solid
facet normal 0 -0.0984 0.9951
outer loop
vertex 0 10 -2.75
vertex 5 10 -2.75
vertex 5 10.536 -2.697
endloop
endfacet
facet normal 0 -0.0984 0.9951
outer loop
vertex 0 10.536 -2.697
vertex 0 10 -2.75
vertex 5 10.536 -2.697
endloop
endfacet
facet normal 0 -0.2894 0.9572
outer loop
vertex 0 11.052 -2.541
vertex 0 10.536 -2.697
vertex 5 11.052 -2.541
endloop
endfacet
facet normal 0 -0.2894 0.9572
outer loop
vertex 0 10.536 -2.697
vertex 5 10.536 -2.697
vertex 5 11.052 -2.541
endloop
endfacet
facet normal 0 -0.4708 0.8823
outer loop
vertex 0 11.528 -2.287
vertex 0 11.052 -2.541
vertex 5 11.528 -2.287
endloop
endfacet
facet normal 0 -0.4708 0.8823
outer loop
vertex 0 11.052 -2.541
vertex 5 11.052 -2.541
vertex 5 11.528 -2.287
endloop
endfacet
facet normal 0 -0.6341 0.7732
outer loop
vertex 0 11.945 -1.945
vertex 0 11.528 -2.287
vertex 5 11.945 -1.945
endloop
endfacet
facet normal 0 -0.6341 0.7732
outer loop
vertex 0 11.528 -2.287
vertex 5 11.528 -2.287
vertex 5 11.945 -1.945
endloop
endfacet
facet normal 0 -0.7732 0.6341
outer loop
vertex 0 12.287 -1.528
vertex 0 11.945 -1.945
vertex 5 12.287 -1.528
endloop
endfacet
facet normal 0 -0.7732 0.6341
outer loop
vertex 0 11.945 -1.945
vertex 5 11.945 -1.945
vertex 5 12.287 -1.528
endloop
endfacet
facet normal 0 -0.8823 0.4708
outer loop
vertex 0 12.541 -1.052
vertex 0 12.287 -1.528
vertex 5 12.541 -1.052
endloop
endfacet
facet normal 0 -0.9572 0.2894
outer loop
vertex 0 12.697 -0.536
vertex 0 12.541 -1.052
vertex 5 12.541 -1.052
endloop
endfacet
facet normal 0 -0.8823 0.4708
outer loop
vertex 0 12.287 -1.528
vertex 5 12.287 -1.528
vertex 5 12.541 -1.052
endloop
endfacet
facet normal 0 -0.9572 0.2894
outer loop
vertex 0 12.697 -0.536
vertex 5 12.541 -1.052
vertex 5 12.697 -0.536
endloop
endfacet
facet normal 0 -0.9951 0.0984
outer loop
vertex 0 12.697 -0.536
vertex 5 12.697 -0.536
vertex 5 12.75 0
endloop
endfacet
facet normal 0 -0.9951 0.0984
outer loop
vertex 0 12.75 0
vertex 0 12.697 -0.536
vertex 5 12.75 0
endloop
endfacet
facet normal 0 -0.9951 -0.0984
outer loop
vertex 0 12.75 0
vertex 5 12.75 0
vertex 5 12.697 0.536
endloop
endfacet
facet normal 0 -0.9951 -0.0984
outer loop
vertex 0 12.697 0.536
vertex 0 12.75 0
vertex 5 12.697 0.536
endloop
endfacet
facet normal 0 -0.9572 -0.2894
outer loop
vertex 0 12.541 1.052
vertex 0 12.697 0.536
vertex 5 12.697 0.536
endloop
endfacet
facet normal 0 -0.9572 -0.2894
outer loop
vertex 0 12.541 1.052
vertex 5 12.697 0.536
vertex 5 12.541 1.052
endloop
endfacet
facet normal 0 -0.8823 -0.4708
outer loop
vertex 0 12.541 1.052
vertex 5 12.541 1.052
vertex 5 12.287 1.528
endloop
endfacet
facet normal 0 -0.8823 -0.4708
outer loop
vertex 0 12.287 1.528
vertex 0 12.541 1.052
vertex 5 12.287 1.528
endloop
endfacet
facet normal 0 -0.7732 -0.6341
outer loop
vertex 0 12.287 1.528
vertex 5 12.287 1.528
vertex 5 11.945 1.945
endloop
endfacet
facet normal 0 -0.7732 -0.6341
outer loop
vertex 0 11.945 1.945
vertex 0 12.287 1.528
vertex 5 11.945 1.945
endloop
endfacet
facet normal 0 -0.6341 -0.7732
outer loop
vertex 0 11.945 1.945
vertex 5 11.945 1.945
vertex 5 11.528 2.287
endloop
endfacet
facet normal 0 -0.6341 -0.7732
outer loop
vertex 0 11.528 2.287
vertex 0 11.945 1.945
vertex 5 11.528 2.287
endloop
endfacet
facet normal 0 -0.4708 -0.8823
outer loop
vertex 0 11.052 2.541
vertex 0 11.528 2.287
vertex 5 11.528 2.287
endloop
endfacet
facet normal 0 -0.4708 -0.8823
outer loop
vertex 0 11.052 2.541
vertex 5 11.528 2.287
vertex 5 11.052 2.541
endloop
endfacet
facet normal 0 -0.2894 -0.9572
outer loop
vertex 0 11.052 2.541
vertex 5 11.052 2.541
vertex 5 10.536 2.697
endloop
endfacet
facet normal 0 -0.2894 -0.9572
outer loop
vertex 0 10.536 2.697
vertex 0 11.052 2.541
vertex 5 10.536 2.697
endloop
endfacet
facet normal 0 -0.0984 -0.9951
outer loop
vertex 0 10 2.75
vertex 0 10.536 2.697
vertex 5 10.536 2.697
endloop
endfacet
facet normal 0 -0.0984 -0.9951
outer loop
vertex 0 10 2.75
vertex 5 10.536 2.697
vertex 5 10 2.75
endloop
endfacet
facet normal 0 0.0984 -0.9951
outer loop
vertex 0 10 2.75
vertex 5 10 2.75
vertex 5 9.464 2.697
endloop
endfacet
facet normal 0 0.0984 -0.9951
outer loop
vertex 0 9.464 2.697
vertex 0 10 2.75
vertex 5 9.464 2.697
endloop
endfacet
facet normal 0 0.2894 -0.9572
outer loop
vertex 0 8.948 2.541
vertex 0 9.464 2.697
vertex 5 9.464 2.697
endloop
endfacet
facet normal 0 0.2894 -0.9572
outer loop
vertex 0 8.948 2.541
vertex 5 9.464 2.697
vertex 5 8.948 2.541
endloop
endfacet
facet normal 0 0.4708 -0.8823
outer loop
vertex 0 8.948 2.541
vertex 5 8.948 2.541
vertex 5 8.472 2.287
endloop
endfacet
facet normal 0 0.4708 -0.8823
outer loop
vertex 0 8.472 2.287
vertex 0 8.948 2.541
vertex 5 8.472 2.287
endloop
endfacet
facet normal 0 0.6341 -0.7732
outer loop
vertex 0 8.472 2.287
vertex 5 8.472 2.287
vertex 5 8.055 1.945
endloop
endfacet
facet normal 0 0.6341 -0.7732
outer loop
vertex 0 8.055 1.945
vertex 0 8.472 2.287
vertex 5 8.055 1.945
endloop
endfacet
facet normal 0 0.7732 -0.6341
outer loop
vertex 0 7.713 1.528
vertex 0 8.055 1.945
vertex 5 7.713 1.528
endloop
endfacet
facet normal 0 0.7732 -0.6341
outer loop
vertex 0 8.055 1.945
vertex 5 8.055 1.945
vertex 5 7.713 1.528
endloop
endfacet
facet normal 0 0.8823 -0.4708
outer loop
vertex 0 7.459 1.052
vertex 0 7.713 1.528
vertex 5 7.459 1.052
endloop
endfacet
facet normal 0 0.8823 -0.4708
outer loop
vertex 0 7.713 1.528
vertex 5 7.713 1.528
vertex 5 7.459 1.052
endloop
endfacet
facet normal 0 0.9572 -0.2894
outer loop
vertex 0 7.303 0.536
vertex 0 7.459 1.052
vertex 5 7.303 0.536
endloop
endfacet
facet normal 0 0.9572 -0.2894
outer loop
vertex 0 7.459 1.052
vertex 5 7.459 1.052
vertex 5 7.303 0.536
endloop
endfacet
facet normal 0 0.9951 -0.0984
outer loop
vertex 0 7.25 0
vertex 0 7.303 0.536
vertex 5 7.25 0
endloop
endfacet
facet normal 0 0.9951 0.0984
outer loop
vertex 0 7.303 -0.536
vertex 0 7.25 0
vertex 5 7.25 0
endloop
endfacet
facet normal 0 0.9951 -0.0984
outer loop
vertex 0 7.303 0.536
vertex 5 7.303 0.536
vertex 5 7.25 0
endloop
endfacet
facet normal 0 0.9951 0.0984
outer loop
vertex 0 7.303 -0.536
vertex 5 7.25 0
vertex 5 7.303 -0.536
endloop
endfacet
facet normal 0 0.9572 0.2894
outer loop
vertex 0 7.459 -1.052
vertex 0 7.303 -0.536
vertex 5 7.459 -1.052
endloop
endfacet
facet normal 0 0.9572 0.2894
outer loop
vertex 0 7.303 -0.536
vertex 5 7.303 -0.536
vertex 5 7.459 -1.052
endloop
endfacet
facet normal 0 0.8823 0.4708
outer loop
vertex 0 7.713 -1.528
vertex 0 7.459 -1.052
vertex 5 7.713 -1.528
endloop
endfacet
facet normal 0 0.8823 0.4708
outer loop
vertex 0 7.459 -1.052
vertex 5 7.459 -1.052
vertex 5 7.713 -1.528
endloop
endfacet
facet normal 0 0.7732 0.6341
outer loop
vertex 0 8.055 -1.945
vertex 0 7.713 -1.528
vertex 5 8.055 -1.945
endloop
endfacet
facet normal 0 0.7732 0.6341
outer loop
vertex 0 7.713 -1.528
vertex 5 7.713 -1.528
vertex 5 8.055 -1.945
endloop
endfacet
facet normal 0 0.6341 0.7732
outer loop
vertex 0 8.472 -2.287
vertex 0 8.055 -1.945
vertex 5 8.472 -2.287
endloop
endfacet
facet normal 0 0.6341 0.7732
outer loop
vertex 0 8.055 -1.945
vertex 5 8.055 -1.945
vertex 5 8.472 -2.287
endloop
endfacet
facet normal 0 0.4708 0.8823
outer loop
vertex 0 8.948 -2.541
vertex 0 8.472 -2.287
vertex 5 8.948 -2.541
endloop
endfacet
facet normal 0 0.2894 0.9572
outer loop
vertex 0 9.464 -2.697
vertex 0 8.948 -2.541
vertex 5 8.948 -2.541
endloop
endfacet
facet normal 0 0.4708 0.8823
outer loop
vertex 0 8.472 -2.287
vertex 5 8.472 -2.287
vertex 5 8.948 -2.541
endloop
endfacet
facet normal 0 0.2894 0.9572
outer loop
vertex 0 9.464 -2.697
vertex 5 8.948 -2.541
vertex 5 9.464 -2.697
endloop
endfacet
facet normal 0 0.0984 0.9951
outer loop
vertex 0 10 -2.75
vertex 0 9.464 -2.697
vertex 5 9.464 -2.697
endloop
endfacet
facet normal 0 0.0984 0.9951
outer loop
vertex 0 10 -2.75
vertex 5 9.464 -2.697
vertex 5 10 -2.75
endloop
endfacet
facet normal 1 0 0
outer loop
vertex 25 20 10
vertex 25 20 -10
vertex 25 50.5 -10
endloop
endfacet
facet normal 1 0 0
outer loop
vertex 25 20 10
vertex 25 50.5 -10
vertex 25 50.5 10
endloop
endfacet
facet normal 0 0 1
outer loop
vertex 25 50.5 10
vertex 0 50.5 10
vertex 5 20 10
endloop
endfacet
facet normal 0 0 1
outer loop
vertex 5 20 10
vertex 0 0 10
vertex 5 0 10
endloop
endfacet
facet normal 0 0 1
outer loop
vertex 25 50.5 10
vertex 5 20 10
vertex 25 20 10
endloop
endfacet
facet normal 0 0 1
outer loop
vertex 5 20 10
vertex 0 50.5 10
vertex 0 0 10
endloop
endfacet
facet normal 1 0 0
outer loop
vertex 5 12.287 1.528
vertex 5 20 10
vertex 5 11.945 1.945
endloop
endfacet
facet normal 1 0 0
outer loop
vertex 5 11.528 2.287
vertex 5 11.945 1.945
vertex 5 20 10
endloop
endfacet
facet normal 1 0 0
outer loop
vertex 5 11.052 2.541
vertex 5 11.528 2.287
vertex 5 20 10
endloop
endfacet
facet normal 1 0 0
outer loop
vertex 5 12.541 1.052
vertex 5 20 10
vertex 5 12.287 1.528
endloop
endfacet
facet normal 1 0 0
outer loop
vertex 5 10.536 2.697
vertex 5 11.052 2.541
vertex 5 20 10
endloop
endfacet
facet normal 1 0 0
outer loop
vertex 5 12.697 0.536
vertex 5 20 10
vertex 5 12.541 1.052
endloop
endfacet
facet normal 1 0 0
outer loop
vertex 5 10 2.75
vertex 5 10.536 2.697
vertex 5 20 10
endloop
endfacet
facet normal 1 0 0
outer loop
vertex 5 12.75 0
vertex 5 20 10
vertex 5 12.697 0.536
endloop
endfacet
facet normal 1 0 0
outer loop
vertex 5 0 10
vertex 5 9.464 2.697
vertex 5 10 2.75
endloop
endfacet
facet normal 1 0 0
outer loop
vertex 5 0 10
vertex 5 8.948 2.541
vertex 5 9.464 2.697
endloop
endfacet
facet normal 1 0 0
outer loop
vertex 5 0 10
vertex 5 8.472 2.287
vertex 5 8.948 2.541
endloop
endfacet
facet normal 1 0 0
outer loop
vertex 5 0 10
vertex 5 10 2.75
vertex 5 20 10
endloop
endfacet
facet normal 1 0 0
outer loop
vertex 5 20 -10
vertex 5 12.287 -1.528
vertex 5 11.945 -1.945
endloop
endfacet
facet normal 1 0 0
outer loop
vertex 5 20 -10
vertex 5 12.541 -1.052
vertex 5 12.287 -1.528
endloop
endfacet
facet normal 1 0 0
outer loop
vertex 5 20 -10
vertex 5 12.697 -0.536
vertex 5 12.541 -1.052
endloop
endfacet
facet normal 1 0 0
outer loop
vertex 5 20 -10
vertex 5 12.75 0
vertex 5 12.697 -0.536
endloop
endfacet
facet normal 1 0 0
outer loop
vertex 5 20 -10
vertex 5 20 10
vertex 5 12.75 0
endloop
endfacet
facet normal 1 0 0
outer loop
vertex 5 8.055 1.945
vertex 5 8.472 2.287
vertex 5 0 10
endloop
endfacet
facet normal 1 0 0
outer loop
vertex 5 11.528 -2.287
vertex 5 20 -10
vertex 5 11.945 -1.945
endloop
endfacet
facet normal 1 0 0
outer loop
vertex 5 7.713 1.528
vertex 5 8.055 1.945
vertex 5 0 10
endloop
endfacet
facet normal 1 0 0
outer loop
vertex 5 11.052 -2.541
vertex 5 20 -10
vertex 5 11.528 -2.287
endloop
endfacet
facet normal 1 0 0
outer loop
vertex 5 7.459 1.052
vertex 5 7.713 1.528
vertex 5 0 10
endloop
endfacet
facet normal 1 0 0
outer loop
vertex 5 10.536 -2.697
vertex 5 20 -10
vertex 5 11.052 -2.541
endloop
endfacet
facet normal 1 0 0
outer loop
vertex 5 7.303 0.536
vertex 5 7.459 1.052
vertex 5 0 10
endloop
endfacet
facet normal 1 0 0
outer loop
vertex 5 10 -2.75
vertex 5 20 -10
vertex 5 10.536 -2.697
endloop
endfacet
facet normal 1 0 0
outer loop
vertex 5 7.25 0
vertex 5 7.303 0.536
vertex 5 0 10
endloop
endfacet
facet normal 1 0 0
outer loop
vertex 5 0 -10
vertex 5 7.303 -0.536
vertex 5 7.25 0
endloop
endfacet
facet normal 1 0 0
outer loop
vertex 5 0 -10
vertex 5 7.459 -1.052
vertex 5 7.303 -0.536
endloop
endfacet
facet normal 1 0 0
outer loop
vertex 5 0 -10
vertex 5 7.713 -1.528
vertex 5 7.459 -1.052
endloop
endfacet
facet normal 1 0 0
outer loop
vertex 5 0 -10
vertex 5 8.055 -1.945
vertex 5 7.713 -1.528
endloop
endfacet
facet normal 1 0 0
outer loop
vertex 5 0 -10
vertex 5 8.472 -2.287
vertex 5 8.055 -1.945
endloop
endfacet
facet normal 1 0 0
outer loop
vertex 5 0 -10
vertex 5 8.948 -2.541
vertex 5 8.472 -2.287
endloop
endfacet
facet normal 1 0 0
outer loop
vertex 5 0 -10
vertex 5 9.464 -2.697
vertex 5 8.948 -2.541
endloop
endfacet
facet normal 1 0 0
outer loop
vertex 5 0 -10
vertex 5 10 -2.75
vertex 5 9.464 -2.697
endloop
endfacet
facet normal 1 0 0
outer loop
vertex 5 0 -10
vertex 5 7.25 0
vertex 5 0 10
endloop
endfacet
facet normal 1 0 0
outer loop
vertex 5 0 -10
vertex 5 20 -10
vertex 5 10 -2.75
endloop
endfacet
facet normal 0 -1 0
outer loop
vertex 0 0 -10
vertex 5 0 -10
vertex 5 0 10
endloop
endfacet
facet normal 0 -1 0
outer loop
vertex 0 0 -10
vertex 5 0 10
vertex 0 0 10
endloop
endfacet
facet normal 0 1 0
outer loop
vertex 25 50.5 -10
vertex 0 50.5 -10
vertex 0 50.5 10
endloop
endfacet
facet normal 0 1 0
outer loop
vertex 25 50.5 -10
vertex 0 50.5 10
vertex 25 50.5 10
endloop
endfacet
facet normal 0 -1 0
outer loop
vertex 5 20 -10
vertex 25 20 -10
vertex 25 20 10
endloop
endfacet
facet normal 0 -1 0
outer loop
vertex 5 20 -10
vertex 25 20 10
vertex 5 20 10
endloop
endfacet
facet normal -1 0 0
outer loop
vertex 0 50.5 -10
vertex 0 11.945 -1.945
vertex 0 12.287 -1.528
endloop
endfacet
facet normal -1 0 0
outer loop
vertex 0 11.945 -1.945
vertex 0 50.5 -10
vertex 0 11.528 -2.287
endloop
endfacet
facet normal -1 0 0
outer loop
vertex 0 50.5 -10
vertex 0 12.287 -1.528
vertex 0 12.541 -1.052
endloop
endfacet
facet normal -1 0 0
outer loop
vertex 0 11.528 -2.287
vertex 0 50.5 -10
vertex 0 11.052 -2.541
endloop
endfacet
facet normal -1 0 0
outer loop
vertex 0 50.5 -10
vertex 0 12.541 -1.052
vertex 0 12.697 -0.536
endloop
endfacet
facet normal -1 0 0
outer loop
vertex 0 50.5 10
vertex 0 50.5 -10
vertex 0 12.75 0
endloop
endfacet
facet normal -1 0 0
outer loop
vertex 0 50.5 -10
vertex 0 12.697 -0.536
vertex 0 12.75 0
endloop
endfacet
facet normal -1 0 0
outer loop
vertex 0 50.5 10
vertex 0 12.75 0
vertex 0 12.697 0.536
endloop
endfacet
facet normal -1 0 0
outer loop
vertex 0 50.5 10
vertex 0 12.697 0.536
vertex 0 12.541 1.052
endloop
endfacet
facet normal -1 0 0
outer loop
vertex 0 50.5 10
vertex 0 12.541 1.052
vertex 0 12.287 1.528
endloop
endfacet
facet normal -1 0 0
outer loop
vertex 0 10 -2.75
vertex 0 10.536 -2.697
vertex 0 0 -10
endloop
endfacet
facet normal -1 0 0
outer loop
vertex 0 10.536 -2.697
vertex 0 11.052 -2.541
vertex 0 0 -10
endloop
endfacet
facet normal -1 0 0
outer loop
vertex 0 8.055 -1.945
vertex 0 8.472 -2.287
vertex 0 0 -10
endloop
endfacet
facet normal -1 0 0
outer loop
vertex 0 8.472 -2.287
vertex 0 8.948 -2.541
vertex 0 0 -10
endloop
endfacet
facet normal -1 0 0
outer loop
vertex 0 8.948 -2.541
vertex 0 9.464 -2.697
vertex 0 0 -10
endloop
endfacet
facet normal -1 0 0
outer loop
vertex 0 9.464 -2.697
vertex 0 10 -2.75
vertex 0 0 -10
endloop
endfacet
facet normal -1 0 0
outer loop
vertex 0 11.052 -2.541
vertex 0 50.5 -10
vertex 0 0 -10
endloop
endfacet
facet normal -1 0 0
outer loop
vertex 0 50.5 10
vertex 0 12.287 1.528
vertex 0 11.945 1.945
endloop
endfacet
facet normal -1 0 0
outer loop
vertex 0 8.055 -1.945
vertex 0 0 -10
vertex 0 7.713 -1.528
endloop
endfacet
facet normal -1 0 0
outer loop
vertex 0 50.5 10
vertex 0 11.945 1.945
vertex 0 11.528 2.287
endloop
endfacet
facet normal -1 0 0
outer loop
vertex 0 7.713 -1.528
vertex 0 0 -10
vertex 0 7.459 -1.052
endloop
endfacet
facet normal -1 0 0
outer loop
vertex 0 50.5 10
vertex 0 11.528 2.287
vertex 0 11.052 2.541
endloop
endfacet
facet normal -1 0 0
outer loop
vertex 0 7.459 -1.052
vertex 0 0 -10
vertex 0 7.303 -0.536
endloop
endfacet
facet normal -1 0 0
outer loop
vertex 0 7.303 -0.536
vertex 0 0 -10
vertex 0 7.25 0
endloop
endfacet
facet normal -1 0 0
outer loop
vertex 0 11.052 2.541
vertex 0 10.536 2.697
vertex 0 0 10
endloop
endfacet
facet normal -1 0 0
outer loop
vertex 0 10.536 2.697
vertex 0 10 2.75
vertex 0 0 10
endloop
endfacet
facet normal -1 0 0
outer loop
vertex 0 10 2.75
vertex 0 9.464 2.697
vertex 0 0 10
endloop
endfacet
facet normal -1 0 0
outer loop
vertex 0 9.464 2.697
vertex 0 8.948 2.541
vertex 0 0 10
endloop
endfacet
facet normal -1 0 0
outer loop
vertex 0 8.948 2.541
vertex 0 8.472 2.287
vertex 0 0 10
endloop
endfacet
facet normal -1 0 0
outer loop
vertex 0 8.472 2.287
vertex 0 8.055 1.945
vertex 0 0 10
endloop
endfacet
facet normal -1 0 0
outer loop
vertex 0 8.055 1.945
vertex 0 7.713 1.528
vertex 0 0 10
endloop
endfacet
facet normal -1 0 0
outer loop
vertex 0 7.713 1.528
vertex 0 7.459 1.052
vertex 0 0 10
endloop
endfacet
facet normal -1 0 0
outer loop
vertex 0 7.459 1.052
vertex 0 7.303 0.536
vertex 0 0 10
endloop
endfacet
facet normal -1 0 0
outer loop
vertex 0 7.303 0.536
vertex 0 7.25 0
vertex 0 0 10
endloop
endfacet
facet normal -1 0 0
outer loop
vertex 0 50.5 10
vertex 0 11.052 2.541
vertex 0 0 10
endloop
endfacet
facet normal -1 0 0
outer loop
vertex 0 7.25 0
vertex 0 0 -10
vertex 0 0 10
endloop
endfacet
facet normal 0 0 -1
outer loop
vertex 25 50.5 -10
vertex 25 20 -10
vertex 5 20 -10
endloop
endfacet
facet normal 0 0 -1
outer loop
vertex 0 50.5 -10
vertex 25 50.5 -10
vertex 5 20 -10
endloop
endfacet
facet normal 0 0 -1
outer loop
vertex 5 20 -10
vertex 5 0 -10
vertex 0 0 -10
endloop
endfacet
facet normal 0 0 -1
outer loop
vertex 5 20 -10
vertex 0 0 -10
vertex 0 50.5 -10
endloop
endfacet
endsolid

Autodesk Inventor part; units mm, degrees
ref_plane "YZ Plane" through (0, 0, 0) normal (1, 0, 0) x (0, 1, 0)
ref_plane "XZ Plane" through (0, 0, 0) normal (0, 1, 0) x (-1, 0, 0)
ref_plane "XY Plane" through (0, 0, 0) normal (0, 0, 1) x (1, 0, 0)
sketch "Sketch1" plane through (0, 0, 0) normal (0, 0, 1) x (1, 0, 0)
  line L0 (0, 0) -> (0, 24)
  line L1 (0, 24) -> (25, 24)
  line L2 (25, 24) -> (25, 20)
  line L3 (25, 20) -> (5, 20)
  line L4 (5, 20) -> (5, 0)
  line L5 (5, 0) -> (0, 0)
  dimension "d0" = 24
  dimension "d1" = 25
  dimension "d2" = 90
  dimension "d3" = 4
  dimension "d4" = 90
  dimension "d5" = 20
extrude "Extrusion1" add sketch "Sketch1" along normal mid plane 20
sketch "Sketch2" plane through (5, 0, 10) normal (1, 0, 0) x (0, 0, -1)
  circle A0 centre (10, 10) radius 2.75
  point P0 (10, 0)
  dimension "d8" = 5.5
extrude "Extrusion2" cut sketch "Sketch2" against normal blind 20
sketch "Sketch3" plane through (0, 24, 10) normal (0, 1, 0) x (1, 0, 0)
  line L0 (0, 20) -> (0, 0) projected
  line L1 (25, 20) -> (25, 0) projected
  line L2 (0, 0) -> (25, 0)
  line L3 (25, 0) -> (25, 20)
  line L4 (25, 20) -> (0, 20)
  line L5 (0, 20) -> (0, 0)
  point P0 (0, 10)
extrude "Extrusion3" add sketch "Sketch3" along normal blind 26.5
properties part number "cylinder segment spacer"
